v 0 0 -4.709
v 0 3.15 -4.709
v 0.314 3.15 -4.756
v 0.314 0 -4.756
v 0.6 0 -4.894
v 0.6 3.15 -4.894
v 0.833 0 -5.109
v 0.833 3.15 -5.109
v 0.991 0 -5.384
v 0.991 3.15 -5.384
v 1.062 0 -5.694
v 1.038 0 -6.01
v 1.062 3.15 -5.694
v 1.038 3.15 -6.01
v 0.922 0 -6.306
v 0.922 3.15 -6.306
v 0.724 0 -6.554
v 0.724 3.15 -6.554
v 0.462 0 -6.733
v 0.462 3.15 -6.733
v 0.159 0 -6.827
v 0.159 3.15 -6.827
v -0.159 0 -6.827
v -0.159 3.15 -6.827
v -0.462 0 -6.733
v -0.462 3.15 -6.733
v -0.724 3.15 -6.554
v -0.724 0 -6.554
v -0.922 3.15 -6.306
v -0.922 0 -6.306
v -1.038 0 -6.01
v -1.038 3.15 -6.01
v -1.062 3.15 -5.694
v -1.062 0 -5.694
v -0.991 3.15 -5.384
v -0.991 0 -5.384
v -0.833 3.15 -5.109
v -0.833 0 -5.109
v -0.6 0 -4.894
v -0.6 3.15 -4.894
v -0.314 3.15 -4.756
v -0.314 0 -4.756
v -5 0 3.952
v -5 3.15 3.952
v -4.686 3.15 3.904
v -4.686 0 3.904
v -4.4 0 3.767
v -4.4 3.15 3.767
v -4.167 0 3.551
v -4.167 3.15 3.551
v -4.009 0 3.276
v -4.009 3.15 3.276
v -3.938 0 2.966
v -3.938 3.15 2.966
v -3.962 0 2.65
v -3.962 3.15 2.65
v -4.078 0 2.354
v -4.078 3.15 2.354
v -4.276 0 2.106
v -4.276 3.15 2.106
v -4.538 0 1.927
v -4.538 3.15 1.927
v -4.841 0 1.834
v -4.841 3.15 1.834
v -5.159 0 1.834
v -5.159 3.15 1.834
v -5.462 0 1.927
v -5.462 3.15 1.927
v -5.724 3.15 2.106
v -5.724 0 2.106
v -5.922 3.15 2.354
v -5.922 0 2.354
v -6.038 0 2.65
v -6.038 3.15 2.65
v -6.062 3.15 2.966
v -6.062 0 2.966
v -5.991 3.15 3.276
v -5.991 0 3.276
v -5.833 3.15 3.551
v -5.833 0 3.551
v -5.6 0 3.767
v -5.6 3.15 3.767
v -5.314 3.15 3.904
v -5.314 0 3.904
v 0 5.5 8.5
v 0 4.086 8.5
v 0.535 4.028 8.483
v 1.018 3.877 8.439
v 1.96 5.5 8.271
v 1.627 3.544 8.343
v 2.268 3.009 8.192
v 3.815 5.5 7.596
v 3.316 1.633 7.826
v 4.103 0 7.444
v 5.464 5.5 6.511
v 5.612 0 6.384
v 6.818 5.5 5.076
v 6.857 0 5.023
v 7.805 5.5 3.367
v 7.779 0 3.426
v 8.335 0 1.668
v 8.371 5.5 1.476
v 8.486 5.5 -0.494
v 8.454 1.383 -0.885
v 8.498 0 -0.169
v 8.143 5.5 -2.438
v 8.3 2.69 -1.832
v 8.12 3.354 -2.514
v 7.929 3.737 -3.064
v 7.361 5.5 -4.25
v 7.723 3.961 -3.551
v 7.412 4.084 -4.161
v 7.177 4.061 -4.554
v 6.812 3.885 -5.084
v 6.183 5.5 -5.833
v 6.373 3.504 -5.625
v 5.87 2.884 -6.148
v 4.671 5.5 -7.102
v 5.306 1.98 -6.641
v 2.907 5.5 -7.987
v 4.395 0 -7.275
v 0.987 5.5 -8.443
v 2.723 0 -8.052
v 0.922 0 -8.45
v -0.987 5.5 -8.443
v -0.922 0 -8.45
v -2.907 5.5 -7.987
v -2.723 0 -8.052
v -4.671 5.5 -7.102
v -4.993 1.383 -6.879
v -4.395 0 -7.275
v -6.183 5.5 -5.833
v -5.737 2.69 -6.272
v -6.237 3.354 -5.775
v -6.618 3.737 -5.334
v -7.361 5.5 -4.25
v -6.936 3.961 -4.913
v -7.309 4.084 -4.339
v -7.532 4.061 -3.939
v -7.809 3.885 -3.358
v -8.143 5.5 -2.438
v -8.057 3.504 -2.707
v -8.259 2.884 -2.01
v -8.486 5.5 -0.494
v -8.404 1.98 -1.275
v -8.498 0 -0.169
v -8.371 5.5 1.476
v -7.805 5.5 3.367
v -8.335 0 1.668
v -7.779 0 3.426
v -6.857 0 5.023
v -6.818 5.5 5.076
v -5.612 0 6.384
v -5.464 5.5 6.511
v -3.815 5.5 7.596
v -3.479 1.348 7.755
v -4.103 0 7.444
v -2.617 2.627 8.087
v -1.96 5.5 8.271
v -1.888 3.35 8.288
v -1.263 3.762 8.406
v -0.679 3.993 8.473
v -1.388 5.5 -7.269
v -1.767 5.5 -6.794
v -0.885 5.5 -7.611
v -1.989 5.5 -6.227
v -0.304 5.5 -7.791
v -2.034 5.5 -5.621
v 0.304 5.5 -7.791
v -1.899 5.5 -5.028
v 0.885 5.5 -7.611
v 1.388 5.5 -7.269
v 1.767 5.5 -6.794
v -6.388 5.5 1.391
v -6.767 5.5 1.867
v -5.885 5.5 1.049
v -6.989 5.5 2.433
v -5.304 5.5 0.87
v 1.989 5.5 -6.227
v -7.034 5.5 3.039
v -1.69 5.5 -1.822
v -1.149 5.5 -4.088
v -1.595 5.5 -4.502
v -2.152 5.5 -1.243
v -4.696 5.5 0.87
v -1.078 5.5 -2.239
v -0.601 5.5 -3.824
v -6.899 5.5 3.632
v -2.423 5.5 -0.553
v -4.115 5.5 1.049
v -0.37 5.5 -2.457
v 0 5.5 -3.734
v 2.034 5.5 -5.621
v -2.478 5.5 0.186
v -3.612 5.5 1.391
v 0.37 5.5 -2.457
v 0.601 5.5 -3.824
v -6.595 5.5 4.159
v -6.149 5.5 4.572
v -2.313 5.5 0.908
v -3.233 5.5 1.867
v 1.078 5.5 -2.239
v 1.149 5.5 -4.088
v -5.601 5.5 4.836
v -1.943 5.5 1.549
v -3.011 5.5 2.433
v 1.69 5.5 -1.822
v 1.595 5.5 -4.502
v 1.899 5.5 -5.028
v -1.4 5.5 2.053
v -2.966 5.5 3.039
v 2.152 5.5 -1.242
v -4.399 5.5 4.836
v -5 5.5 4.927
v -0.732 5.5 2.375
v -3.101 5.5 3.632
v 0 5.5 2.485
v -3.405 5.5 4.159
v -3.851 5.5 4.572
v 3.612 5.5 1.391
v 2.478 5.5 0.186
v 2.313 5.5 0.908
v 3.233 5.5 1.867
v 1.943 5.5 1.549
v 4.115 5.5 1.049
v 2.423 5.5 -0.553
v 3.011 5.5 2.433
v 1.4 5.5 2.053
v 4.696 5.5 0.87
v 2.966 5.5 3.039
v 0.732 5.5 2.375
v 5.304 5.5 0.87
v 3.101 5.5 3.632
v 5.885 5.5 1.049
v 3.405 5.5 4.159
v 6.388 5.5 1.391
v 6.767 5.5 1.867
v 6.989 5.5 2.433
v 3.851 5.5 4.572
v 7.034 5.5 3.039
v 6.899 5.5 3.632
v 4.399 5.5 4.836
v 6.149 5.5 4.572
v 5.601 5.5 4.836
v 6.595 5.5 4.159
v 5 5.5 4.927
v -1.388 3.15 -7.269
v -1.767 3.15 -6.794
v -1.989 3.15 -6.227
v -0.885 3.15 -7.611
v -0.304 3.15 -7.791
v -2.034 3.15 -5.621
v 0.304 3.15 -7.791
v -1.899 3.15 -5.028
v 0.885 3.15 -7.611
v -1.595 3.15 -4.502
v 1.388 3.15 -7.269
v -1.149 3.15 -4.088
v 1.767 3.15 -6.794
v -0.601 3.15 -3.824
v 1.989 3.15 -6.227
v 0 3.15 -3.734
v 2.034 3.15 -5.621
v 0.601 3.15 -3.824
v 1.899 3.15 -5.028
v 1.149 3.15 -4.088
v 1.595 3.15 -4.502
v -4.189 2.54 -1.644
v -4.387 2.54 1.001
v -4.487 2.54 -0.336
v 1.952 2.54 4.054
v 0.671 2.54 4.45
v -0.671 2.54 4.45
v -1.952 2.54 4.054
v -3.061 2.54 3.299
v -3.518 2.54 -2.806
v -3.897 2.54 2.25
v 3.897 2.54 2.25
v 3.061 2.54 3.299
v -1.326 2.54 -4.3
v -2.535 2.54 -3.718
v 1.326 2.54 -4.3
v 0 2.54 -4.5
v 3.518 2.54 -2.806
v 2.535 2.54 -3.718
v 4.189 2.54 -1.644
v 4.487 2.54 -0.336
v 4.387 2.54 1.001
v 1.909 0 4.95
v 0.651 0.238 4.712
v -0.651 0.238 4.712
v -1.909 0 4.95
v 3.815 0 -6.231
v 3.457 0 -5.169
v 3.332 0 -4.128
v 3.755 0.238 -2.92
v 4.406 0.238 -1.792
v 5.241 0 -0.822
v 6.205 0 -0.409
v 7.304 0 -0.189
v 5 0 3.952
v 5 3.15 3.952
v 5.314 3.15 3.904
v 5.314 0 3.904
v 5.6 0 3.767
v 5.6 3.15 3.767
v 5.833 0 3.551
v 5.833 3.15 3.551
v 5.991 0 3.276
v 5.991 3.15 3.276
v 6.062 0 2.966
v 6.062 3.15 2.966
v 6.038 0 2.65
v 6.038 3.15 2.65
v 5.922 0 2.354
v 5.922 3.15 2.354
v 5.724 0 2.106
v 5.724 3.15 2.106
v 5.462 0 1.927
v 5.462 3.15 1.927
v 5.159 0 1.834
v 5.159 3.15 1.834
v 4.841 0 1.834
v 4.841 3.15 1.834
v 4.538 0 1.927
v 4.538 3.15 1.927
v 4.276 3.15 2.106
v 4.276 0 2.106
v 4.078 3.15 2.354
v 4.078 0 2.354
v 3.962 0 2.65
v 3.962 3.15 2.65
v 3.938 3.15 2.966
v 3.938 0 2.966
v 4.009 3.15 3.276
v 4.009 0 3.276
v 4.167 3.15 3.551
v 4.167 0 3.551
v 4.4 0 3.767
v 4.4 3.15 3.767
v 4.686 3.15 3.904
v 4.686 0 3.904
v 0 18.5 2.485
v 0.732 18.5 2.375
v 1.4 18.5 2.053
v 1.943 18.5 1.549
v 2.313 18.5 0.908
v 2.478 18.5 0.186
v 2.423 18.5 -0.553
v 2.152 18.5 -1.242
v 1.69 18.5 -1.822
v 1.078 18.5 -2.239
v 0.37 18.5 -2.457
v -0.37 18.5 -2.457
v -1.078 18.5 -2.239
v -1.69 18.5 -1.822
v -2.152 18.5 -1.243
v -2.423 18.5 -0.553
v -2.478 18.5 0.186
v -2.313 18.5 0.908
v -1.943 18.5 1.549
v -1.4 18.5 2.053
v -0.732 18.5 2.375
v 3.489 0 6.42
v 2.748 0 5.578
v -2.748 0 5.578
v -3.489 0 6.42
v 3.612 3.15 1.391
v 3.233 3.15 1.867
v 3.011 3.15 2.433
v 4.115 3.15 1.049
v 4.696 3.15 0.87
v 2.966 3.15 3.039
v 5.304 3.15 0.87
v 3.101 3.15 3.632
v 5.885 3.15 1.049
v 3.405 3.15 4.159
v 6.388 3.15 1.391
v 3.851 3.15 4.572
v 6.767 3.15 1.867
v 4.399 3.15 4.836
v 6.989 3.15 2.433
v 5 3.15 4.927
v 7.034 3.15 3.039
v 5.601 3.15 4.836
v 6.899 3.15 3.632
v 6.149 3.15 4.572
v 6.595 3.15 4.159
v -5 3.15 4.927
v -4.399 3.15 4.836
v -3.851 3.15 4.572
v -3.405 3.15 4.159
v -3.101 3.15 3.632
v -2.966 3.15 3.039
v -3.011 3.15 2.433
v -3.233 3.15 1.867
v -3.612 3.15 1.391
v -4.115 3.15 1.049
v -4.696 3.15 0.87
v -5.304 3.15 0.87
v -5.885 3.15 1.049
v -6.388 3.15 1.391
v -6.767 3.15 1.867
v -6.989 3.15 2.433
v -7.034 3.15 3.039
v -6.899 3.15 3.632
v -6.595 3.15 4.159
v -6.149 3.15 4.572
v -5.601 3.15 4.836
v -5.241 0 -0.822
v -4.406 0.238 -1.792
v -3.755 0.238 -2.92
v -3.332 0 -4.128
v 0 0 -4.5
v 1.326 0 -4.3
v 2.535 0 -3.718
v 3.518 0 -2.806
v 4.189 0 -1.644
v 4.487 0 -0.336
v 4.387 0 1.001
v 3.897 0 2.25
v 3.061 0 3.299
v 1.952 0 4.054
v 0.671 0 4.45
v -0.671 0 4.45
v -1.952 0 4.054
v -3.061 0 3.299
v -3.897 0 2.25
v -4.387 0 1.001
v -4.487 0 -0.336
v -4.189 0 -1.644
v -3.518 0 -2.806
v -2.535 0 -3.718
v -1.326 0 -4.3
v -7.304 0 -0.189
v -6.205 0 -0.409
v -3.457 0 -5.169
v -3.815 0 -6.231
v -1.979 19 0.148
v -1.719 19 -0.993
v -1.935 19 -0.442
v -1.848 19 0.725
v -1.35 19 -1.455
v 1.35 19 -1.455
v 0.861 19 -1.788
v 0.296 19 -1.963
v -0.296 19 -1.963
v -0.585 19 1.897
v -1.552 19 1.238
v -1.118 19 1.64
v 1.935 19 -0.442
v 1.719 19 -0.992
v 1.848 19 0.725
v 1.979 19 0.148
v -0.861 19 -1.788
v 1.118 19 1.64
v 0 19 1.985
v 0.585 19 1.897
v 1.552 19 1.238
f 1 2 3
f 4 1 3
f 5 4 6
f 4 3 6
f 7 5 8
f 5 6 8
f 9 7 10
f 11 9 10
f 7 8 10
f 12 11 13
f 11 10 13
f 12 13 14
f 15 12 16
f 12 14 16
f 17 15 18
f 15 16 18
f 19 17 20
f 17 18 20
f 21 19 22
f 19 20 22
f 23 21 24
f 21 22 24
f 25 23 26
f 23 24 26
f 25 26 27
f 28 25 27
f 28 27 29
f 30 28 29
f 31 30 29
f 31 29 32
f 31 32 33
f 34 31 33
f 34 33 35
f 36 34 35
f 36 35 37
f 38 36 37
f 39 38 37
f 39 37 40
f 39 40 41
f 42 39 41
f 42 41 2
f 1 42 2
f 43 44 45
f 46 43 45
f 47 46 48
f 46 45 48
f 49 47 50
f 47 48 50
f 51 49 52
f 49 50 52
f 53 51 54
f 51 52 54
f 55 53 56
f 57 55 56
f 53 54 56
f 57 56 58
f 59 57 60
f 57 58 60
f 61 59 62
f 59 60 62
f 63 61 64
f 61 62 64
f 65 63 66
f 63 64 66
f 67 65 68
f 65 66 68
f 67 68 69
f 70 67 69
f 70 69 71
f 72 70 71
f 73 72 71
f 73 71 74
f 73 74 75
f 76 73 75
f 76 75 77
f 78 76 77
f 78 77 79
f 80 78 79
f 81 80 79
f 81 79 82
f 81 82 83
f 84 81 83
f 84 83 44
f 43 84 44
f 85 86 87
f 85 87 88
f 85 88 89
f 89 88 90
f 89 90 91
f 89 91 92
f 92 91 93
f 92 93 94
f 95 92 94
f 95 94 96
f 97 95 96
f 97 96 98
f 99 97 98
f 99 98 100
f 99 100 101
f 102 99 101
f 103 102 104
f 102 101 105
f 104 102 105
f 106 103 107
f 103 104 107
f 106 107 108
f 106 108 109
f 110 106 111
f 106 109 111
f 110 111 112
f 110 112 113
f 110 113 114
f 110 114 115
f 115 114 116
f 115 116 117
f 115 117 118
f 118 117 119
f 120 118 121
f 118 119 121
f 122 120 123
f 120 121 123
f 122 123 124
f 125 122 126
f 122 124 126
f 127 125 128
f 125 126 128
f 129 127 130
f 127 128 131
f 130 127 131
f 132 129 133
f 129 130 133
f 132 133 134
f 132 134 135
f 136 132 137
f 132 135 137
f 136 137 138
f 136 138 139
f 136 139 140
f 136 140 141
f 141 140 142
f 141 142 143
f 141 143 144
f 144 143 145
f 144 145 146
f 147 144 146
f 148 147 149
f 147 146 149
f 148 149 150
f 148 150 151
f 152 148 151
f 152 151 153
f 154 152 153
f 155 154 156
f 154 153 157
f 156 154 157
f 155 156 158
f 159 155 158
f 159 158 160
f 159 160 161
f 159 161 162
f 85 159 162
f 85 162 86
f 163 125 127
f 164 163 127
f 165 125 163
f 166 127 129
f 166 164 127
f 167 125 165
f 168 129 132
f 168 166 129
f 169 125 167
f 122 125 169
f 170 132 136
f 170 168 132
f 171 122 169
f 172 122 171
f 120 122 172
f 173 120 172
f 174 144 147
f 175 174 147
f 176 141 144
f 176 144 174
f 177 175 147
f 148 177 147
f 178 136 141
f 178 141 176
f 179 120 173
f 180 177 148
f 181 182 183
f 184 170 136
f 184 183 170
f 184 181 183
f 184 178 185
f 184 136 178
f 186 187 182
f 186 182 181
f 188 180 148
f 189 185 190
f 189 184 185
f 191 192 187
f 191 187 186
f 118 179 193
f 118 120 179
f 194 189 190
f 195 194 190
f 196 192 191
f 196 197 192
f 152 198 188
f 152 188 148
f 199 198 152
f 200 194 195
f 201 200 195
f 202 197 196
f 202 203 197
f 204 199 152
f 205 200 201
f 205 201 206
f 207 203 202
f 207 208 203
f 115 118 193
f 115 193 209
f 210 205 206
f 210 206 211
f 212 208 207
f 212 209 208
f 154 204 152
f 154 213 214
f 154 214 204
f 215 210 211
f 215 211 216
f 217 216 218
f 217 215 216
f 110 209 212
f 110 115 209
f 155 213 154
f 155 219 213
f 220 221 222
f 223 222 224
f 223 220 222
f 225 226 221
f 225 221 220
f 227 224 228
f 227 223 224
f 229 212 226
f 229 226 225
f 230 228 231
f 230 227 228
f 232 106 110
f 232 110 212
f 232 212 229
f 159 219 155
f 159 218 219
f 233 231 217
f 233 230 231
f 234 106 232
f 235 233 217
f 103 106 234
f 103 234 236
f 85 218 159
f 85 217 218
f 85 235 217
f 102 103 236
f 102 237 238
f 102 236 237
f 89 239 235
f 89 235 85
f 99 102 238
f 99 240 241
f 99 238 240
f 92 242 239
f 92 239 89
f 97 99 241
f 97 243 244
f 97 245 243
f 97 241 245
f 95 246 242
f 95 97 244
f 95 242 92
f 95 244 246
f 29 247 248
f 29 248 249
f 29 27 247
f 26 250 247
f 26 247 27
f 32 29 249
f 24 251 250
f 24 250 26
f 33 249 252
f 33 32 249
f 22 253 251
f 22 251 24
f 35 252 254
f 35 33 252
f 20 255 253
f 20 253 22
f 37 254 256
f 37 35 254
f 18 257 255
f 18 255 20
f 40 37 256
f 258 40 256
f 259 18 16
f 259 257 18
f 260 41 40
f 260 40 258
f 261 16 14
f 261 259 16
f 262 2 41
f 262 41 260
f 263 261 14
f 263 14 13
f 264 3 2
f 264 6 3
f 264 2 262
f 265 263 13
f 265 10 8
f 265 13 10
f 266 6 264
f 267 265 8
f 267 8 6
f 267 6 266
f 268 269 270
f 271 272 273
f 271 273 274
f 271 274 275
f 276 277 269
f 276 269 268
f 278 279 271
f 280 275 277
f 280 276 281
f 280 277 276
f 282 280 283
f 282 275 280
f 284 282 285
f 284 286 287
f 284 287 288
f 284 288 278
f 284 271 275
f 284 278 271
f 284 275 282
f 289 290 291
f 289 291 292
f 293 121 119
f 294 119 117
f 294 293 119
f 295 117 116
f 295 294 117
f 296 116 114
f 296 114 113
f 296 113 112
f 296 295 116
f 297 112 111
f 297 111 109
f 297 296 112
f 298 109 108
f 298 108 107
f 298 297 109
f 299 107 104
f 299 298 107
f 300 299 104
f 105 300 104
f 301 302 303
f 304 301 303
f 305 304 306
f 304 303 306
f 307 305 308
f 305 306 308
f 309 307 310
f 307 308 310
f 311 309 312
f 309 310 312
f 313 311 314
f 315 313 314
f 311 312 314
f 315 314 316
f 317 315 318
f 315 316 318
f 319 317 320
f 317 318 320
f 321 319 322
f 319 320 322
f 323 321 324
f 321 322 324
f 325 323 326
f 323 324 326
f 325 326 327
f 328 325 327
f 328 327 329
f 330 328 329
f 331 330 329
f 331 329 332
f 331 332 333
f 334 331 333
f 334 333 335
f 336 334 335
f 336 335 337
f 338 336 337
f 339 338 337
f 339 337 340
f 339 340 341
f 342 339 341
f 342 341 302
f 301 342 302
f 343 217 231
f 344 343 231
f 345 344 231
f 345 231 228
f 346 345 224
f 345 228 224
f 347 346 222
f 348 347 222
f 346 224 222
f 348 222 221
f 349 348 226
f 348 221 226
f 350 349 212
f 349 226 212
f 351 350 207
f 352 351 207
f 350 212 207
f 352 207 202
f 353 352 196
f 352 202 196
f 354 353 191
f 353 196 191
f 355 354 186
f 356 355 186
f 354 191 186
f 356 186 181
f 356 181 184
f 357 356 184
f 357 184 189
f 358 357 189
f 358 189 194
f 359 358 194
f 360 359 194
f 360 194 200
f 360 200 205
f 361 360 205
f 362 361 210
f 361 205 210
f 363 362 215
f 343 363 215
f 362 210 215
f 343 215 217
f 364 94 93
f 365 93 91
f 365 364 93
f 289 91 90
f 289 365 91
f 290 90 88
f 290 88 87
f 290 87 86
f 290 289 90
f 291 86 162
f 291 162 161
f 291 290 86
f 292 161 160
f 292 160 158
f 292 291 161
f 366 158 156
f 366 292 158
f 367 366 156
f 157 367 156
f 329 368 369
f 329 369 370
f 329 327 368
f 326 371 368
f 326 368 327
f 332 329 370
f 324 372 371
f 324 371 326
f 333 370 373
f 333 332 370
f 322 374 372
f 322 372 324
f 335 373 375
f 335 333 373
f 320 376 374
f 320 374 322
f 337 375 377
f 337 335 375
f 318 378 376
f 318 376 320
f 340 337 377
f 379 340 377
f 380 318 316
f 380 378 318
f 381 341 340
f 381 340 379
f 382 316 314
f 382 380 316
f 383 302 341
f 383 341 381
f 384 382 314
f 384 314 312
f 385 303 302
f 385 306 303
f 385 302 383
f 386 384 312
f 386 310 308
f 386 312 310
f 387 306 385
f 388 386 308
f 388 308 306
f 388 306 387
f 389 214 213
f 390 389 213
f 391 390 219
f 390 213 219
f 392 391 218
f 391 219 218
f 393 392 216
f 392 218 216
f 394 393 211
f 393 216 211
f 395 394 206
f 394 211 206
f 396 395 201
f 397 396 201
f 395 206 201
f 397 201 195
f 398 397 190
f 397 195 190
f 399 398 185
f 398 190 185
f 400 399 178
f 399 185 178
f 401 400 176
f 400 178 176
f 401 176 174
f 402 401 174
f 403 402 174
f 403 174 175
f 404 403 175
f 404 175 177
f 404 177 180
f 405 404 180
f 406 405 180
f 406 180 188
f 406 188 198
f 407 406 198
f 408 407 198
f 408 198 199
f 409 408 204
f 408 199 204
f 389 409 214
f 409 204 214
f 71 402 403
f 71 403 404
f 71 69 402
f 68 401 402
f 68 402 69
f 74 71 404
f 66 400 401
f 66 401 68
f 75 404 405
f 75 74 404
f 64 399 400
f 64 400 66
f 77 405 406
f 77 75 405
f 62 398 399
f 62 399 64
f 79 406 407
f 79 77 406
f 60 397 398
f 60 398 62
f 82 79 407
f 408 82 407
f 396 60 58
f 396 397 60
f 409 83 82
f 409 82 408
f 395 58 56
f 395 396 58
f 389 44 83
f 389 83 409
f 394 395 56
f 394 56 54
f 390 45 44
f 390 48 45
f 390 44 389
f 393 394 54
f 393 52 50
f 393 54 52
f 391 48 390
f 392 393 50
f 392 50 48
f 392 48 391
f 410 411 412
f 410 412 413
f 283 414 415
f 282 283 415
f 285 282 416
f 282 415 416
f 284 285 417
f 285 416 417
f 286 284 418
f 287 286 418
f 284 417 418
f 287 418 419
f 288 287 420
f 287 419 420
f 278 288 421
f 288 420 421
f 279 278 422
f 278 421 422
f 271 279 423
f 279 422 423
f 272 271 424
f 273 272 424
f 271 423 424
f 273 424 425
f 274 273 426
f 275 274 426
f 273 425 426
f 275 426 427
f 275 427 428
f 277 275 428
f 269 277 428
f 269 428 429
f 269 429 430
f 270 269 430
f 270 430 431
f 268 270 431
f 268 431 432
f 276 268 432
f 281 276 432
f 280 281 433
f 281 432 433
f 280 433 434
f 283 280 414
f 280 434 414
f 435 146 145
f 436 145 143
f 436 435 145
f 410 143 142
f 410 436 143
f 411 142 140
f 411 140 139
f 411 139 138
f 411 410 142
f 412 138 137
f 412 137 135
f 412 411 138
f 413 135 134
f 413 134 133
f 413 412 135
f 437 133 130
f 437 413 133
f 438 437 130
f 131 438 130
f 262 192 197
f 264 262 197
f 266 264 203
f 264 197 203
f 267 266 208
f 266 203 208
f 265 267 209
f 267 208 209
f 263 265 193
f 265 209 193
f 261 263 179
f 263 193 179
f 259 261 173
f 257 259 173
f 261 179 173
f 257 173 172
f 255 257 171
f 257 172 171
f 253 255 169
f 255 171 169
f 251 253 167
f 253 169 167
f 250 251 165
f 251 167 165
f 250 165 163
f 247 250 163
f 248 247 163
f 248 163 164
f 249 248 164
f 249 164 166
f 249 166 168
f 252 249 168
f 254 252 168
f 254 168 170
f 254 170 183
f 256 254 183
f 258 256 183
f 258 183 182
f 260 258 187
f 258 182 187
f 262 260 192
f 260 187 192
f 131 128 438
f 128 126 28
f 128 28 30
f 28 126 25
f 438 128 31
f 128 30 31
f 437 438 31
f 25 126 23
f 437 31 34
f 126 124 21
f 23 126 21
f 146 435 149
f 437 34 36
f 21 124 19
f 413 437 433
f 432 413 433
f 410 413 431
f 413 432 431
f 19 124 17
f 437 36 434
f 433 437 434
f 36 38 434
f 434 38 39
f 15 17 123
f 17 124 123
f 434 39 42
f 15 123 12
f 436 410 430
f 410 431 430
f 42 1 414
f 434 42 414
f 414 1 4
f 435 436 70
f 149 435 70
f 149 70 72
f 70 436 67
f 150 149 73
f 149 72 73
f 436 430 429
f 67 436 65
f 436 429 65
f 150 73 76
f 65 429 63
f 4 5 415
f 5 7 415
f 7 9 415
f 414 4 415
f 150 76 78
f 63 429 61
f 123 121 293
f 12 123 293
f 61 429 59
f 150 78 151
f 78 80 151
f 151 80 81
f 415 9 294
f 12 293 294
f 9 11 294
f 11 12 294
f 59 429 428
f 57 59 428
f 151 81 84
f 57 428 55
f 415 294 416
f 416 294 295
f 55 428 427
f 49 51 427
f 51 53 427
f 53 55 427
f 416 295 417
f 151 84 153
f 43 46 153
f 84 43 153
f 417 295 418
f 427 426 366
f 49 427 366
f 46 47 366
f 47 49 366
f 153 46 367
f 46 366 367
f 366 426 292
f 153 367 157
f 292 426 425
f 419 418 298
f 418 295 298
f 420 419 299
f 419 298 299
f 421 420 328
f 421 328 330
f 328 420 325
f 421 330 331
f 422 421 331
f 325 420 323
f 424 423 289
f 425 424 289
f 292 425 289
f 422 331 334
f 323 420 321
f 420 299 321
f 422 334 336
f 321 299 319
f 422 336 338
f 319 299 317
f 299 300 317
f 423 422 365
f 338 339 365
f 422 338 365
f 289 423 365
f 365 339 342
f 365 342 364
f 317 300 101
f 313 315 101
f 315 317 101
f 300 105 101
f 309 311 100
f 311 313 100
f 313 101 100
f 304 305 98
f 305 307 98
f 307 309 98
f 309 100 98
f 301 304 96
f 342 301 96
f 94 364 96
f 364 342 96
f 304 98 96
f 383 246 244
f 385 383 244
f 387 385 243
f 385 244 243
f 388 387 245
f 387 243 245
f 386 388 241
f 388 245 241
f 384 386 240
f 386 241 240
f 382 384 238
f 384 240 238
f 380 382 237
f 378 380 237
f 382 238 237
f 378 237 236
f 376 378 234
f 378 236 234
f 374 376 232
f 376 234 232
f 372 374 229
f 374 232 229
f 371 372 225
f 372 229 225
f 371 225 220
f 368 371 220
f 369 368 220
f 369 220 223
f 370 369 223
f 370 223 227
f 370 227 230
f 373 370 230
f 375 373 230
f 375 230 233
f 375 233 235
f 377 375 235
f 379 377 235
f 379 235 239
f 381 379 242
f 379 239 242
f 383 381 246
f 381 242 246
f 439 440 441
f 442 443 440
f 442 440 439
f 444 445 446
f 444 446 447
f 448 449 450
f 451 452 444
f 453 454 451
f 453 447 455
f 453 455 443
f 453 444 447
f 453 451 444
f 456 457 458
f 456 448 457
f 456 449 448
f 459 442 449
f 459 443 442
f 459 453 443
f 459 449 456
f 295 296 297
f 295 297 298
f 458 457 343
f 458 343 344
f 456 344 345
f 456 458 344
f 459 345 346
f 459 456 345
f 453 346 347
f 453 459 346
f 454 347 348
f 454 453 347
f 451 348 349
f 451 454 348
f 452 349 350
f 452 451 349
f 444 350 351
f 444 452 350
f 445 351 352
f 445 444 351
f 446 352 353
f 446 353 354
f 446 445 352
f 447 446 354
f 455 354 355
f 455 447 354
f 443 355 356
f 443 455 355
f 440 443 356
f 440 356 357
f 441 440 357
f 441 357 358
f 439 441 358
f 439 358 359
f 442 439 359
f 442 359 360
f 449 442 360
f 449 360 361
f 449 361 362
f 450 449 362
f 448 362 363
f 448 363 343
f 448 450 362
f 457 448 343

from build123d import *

# Parameters (mm, degrees)
SKETCH1_R           = 8.5
BOSS_EXTRUDE1_DEPTH = 5.5
SKETCH2_R           = 2.485
BOSS_EXTRUDE2_DEPTH = 13.5
CHAMFER1_SIZE       = 0.5
SKETCH5_R           = 4.5
CUT_EXTRUDE3_DEPTH  = 2.54
SKETCH3_R           = 2.04
CUT_EXTRUDE1_DEPTH  = 2.35
SKETCH4_R           = 1.065
CUT_EXTRUDE2_DEPTH  = 22.35
SKETCH7_R           = 5
CUT_EXTRUDE5_DEPTH  = 11.54
CIRPATTERN1_COUNT   = 3


with BuildPart() as part:
    # Sketch1 → Boss-Extrude1 (new body)
    with BuildSketch(Plane(origin=(0, 0, 0), x_dir=(1, 0, 0), z_dir=(0, 1, 0))):
        with Locations(Location((0, 0, 0), (0, 0, 270))):
            Circle(SKETCH1_R)
    extrude(amount=BOSS_EXTRUDE1_DEPTH)

    # Sketch2 → Boss-Extrude2 (add)
    with BuildSketch(Plane(origin=(0, 5.5, 0), x_dir=(1, 0, 0), z_dir=(0, 1, 0))):
        with Locations(Location((0, 0, 0), (0, 0, 270))):
            Circle(SKETCH2_R)
    extrude(amount=BOSS_EXTRUDE2_DEPTH)

    # Chamfer1
    chamfer1_edges = [part.edges().sort_by_distance(p)[0] for p in [
        (0, 19, -2.485),
    ]]
    chamfer(chamfer1_edges, length=CHAMFER1_SIZE)

    # Sketch5 → Cut-Extrude3 (cut)
    with BuildSketch(Plane.XZ):
        with Locations(Location((0, 0, 0), (0, 0, 270))):
            Circle(SKETCH5_R)
    extrude(amount=-CUT_EXTRUDE3_DEPTH, mode=Mode.SUBTRACT)

    # Sketch3 → Cut-Extrude1 (cut)
    with BuildSketch(Plane(origin=(0, 5.5, 0), x_dir=(1, 0, 0), z_dir=(0, 1, 0))):
        with Locations(Location((0, 5.773502692, 0), (0, 0, 270))):
            Circle(SKETCH3_R)
        with Locations(Location((5, -2.886751346, 0), (0, 0, 270))):
            Circle(SKETCH3_R)
        with Locations(Location((-5, -2.886751346, 0), (0, 0, 270))):
            Circle(SKETCH3_R)
    extrude(amount=-CUT_EXTRUDE1_DEPTH, mode=Mode.SUBTRACT)

    # Sketch4 → Cut-Extrude2 (cut)
    with BuildSketch(Plane(origin=(0, 3.15, 0), x_dir=(1, 0, 0), z_dir=(0, 1, 0))):
        with Locations(Location((0, 5.773502692, 0), (0, 0, 270))):
            Circle(SKETCH4_R)
        with Locations(Location((5, -2.886751346, 0), (0, 0, 270))):
            Circle(SKETCH4_R)
        with Locations(Location((-5, -2.886751346, 0), (0, 0, 270))):
            Circle(SKETCH4_R)
    extrude(amount=-CUT_EXTRUDE2_DEPTH, mode=Mode.SUBTRACT)

    # Sketch7 → Cut-Extrude5 (cut)
    with BuildSketch(Plane(origin=(0, 2.474873734, 2.474873734), x_dir=(1, 0, 0), z_dir=(0, 0.7071067811865476, 0.7071067811865476))):
        with Locations((0, -8.121320344)):
            Circle(SKETCH7_R)
    cut_extrude5 = extrude(amount=CUT_EXTRUDE5_DEPTH, mode=Mode.SUBTRACT)

    # CirPattern1: Cut-Extrude5 ×3 about axis
    cirpattern1_axis = Axis((0, 0, 0), (0, 1, 0))
    for i in range(1, CIRPATTERN1_COUNT):
        add(cut_extrude5.rotate(cirpattern1_axis, i * 360 / CIRPATTERN1_COUNT), mode=Mode.SUBTRACT)


solid = part.part
